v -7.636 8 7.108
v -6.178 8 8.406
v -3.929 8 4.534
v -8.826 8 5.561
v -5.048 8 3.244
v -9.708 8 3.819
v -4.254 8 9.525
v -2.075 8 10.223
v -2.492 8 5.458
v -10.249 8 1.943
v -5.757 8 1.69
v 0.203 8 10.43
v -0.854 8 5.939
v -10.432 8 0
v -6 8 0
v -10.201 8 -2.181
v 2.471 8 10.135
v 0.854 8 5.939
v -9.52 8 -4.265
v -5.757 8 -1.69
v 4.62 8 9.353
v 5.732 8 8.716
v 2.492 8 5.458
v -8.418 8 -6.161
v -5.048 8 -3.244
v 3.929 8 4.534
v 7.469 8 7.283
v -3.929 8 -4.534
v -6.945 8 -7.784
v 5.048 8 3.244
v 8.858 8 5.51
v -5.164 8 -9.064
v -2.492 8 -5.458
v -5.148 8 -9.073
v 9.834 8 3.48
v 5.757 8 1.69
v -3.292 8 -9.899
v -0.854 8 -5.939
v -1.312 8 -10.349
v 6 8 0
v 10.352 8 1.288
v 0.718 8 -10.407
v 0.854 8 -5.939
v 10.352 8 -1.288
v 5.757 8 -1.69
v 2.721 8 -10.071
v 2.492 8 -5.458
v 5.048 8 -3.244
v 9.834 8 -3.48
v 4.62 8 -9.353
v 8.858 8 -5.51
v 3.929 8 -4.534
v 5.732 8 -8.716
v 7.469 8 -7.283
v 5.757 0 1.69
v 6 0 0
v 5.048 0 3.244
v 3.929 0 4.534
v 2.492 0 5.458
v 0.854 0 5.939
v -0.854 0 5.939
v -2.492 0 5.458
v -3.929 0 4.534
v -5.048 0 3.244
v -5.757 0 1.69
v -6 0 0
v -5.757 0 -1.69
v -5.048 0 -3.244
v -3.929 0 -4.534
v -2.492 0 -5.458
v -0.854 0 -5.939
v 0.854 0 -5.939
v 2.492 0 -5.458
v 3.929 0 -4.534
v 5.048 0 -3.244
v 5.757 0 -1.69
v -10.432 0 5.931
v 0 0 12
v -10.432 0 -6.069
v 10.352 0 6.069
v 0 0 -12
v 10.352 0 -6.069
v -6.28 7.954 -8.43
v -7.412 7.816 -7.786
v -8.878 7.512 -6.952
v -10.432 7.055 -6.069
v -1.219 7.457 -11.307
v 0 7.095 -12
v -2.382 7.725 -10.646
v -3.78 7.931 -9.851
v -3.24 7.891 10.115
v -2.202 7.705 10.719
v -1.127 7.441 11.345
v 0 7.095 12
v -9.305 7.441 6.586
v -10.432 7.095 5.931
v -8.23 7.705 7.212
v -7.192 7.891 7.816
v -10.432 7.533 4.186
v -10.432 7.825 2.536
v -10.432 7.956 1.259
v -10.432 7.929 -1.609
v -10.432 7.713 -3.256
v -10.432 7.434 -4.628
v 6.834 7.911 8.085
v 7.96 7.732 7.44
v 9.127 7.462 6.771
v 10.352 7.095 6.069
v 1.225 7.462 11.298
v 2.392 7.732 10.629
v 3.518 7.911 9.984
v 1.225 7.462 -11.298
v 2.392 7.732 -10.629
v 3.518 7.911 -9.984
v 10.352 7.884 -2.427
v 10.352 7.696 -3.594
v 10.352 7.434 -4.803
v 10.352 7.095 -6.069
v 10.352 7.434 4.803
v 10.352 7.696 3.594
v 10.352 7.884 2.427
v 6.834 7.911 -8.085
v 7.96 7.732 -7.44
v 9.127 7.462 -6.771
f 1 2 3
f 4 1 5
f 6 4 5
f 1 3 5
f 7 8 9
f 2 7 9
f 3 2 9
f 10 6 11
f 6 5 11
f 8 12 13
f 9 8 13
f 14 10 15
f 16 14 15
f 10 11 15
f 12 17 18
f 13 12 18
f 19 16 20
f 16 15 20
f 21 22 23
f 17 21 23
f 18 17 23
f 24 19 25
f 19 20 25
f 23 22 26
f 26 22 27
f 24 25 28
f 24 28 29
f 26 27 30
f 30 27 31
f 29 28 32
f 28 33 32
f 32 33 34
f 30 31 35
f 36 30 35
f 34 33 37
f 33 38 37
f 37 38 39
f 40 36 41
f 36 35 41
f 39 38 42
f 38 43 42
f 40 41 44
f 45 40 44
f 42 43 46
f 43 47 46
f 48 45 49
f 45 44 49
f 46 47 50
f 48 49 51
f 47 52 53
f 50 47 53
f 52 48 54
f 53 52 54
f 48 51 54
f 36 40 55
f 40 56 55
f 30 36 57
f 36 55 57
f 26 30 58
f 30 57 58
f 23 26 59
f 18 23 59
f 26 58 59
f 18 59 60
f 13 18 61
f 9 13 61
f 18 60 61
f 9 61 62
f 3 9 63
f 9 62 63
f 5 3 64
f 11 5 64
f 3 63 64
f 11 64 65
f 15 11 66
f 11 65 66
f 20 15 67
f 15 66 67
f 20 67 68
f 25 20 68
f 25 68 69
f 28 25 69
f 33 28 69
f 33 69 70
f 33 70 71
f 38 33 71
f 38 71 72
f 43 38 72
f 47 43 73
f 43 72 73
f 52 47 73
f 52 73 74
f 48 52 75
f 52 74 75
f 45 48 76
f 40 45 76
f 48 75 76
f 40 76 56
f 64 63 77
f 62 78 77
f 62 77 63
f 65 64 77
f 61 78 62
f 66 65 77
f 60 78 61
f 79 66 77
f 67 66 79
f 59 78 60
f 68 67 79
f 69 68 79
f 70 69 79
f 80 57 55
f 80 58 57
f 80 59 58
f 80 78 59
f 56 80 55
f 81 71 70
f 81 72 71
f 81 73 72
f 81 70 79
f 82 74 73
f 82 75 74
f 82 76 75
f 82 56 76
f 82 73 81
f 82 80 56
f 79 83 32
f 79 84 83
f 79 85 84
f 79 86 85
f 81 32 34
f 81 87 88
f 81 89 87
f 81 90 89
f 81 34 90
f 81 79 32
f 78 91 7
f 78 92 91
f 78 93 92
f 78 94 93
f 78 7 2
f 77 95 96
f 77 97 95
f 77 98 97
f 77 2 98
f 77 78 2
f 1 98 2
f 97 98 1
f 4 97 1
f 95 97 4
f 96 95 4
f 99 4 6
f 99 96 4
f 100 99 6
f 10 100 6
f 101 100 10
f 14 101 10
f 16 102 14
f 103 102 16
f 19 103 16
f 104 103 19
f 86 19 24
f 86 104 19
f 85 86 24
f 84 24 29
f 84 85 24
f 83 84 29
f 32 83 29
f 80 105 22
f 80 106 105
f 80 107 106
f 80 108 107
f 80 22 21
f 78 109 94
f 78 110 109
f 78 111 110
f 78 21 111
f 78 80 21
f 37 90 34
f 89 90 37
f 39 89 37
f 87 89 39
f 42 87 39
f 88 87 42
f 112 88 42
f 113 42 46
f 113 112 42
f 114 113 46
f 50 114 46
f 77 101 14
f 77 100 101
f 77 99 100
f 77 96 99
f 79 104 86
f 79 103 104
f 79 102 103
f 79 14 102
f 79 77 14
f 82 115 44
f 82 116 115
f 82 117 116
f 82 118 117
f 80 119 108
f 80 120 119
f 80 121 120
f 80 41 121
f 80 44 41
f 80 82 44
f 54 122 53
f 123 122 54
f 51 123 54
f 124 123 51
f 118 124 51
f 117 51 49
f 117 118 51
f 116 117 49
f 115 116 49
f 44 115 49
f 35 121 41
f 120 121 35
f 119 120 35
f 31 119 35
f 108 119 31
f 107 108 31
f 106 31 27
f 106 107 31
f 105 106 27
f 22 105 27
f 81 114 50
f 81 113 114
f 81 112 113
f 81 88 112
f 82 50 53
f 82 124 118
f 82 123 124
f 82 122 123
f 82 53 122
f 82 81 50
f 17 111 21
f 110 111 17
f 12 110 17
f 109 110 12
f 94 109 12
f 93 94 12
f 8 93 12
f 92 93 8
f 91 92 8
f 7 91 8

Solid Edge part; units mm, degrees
sketch "Sketch1" plane through (0, 0, 0) normal (0, -1, 0) x (1, 0, 0)
  line L0 (10.3521, 6.0691) -> (0, 12)
  line L1 (0, 12) -> (-10.4319, 5.9309)
  line L2 (-10.4319, 5.9309) -> (-10.4319, -6.0691)
  line L3 (-10.4319, -6.0691) -> (0, -12)
  line L4 (0, -12) -> (10.3521, -6.0691)
  line L5 (10.3521, -6.0691) -> (10.3521, 6.0691)
extrude "Protrusion1" add sketch "Sketch1" against normal blind 8
sketch "Sketch2" plane through (0, 0, 0) normal (0, 0, 1) x (1, 0, 0)
  line L0 (-10.4319, 8) -> (-3.0632, 12.2543)
revolve "RevolvedCutout1" cut sketch "Sketch2" angle 360 about axis through (0, 25.4232, 0) along (0, -1, 0) material side at (-6.7725, 10.1705, 0)
sketch "Sketch3" plane through (0, 0, 0) normal (0, -1, 0) x (1, 0, 0)
  circle A0 centre (0, 0) radius 6
extrude "ExtrudedCutout_1" cut sketch "Sketch3" against normal blind 10
